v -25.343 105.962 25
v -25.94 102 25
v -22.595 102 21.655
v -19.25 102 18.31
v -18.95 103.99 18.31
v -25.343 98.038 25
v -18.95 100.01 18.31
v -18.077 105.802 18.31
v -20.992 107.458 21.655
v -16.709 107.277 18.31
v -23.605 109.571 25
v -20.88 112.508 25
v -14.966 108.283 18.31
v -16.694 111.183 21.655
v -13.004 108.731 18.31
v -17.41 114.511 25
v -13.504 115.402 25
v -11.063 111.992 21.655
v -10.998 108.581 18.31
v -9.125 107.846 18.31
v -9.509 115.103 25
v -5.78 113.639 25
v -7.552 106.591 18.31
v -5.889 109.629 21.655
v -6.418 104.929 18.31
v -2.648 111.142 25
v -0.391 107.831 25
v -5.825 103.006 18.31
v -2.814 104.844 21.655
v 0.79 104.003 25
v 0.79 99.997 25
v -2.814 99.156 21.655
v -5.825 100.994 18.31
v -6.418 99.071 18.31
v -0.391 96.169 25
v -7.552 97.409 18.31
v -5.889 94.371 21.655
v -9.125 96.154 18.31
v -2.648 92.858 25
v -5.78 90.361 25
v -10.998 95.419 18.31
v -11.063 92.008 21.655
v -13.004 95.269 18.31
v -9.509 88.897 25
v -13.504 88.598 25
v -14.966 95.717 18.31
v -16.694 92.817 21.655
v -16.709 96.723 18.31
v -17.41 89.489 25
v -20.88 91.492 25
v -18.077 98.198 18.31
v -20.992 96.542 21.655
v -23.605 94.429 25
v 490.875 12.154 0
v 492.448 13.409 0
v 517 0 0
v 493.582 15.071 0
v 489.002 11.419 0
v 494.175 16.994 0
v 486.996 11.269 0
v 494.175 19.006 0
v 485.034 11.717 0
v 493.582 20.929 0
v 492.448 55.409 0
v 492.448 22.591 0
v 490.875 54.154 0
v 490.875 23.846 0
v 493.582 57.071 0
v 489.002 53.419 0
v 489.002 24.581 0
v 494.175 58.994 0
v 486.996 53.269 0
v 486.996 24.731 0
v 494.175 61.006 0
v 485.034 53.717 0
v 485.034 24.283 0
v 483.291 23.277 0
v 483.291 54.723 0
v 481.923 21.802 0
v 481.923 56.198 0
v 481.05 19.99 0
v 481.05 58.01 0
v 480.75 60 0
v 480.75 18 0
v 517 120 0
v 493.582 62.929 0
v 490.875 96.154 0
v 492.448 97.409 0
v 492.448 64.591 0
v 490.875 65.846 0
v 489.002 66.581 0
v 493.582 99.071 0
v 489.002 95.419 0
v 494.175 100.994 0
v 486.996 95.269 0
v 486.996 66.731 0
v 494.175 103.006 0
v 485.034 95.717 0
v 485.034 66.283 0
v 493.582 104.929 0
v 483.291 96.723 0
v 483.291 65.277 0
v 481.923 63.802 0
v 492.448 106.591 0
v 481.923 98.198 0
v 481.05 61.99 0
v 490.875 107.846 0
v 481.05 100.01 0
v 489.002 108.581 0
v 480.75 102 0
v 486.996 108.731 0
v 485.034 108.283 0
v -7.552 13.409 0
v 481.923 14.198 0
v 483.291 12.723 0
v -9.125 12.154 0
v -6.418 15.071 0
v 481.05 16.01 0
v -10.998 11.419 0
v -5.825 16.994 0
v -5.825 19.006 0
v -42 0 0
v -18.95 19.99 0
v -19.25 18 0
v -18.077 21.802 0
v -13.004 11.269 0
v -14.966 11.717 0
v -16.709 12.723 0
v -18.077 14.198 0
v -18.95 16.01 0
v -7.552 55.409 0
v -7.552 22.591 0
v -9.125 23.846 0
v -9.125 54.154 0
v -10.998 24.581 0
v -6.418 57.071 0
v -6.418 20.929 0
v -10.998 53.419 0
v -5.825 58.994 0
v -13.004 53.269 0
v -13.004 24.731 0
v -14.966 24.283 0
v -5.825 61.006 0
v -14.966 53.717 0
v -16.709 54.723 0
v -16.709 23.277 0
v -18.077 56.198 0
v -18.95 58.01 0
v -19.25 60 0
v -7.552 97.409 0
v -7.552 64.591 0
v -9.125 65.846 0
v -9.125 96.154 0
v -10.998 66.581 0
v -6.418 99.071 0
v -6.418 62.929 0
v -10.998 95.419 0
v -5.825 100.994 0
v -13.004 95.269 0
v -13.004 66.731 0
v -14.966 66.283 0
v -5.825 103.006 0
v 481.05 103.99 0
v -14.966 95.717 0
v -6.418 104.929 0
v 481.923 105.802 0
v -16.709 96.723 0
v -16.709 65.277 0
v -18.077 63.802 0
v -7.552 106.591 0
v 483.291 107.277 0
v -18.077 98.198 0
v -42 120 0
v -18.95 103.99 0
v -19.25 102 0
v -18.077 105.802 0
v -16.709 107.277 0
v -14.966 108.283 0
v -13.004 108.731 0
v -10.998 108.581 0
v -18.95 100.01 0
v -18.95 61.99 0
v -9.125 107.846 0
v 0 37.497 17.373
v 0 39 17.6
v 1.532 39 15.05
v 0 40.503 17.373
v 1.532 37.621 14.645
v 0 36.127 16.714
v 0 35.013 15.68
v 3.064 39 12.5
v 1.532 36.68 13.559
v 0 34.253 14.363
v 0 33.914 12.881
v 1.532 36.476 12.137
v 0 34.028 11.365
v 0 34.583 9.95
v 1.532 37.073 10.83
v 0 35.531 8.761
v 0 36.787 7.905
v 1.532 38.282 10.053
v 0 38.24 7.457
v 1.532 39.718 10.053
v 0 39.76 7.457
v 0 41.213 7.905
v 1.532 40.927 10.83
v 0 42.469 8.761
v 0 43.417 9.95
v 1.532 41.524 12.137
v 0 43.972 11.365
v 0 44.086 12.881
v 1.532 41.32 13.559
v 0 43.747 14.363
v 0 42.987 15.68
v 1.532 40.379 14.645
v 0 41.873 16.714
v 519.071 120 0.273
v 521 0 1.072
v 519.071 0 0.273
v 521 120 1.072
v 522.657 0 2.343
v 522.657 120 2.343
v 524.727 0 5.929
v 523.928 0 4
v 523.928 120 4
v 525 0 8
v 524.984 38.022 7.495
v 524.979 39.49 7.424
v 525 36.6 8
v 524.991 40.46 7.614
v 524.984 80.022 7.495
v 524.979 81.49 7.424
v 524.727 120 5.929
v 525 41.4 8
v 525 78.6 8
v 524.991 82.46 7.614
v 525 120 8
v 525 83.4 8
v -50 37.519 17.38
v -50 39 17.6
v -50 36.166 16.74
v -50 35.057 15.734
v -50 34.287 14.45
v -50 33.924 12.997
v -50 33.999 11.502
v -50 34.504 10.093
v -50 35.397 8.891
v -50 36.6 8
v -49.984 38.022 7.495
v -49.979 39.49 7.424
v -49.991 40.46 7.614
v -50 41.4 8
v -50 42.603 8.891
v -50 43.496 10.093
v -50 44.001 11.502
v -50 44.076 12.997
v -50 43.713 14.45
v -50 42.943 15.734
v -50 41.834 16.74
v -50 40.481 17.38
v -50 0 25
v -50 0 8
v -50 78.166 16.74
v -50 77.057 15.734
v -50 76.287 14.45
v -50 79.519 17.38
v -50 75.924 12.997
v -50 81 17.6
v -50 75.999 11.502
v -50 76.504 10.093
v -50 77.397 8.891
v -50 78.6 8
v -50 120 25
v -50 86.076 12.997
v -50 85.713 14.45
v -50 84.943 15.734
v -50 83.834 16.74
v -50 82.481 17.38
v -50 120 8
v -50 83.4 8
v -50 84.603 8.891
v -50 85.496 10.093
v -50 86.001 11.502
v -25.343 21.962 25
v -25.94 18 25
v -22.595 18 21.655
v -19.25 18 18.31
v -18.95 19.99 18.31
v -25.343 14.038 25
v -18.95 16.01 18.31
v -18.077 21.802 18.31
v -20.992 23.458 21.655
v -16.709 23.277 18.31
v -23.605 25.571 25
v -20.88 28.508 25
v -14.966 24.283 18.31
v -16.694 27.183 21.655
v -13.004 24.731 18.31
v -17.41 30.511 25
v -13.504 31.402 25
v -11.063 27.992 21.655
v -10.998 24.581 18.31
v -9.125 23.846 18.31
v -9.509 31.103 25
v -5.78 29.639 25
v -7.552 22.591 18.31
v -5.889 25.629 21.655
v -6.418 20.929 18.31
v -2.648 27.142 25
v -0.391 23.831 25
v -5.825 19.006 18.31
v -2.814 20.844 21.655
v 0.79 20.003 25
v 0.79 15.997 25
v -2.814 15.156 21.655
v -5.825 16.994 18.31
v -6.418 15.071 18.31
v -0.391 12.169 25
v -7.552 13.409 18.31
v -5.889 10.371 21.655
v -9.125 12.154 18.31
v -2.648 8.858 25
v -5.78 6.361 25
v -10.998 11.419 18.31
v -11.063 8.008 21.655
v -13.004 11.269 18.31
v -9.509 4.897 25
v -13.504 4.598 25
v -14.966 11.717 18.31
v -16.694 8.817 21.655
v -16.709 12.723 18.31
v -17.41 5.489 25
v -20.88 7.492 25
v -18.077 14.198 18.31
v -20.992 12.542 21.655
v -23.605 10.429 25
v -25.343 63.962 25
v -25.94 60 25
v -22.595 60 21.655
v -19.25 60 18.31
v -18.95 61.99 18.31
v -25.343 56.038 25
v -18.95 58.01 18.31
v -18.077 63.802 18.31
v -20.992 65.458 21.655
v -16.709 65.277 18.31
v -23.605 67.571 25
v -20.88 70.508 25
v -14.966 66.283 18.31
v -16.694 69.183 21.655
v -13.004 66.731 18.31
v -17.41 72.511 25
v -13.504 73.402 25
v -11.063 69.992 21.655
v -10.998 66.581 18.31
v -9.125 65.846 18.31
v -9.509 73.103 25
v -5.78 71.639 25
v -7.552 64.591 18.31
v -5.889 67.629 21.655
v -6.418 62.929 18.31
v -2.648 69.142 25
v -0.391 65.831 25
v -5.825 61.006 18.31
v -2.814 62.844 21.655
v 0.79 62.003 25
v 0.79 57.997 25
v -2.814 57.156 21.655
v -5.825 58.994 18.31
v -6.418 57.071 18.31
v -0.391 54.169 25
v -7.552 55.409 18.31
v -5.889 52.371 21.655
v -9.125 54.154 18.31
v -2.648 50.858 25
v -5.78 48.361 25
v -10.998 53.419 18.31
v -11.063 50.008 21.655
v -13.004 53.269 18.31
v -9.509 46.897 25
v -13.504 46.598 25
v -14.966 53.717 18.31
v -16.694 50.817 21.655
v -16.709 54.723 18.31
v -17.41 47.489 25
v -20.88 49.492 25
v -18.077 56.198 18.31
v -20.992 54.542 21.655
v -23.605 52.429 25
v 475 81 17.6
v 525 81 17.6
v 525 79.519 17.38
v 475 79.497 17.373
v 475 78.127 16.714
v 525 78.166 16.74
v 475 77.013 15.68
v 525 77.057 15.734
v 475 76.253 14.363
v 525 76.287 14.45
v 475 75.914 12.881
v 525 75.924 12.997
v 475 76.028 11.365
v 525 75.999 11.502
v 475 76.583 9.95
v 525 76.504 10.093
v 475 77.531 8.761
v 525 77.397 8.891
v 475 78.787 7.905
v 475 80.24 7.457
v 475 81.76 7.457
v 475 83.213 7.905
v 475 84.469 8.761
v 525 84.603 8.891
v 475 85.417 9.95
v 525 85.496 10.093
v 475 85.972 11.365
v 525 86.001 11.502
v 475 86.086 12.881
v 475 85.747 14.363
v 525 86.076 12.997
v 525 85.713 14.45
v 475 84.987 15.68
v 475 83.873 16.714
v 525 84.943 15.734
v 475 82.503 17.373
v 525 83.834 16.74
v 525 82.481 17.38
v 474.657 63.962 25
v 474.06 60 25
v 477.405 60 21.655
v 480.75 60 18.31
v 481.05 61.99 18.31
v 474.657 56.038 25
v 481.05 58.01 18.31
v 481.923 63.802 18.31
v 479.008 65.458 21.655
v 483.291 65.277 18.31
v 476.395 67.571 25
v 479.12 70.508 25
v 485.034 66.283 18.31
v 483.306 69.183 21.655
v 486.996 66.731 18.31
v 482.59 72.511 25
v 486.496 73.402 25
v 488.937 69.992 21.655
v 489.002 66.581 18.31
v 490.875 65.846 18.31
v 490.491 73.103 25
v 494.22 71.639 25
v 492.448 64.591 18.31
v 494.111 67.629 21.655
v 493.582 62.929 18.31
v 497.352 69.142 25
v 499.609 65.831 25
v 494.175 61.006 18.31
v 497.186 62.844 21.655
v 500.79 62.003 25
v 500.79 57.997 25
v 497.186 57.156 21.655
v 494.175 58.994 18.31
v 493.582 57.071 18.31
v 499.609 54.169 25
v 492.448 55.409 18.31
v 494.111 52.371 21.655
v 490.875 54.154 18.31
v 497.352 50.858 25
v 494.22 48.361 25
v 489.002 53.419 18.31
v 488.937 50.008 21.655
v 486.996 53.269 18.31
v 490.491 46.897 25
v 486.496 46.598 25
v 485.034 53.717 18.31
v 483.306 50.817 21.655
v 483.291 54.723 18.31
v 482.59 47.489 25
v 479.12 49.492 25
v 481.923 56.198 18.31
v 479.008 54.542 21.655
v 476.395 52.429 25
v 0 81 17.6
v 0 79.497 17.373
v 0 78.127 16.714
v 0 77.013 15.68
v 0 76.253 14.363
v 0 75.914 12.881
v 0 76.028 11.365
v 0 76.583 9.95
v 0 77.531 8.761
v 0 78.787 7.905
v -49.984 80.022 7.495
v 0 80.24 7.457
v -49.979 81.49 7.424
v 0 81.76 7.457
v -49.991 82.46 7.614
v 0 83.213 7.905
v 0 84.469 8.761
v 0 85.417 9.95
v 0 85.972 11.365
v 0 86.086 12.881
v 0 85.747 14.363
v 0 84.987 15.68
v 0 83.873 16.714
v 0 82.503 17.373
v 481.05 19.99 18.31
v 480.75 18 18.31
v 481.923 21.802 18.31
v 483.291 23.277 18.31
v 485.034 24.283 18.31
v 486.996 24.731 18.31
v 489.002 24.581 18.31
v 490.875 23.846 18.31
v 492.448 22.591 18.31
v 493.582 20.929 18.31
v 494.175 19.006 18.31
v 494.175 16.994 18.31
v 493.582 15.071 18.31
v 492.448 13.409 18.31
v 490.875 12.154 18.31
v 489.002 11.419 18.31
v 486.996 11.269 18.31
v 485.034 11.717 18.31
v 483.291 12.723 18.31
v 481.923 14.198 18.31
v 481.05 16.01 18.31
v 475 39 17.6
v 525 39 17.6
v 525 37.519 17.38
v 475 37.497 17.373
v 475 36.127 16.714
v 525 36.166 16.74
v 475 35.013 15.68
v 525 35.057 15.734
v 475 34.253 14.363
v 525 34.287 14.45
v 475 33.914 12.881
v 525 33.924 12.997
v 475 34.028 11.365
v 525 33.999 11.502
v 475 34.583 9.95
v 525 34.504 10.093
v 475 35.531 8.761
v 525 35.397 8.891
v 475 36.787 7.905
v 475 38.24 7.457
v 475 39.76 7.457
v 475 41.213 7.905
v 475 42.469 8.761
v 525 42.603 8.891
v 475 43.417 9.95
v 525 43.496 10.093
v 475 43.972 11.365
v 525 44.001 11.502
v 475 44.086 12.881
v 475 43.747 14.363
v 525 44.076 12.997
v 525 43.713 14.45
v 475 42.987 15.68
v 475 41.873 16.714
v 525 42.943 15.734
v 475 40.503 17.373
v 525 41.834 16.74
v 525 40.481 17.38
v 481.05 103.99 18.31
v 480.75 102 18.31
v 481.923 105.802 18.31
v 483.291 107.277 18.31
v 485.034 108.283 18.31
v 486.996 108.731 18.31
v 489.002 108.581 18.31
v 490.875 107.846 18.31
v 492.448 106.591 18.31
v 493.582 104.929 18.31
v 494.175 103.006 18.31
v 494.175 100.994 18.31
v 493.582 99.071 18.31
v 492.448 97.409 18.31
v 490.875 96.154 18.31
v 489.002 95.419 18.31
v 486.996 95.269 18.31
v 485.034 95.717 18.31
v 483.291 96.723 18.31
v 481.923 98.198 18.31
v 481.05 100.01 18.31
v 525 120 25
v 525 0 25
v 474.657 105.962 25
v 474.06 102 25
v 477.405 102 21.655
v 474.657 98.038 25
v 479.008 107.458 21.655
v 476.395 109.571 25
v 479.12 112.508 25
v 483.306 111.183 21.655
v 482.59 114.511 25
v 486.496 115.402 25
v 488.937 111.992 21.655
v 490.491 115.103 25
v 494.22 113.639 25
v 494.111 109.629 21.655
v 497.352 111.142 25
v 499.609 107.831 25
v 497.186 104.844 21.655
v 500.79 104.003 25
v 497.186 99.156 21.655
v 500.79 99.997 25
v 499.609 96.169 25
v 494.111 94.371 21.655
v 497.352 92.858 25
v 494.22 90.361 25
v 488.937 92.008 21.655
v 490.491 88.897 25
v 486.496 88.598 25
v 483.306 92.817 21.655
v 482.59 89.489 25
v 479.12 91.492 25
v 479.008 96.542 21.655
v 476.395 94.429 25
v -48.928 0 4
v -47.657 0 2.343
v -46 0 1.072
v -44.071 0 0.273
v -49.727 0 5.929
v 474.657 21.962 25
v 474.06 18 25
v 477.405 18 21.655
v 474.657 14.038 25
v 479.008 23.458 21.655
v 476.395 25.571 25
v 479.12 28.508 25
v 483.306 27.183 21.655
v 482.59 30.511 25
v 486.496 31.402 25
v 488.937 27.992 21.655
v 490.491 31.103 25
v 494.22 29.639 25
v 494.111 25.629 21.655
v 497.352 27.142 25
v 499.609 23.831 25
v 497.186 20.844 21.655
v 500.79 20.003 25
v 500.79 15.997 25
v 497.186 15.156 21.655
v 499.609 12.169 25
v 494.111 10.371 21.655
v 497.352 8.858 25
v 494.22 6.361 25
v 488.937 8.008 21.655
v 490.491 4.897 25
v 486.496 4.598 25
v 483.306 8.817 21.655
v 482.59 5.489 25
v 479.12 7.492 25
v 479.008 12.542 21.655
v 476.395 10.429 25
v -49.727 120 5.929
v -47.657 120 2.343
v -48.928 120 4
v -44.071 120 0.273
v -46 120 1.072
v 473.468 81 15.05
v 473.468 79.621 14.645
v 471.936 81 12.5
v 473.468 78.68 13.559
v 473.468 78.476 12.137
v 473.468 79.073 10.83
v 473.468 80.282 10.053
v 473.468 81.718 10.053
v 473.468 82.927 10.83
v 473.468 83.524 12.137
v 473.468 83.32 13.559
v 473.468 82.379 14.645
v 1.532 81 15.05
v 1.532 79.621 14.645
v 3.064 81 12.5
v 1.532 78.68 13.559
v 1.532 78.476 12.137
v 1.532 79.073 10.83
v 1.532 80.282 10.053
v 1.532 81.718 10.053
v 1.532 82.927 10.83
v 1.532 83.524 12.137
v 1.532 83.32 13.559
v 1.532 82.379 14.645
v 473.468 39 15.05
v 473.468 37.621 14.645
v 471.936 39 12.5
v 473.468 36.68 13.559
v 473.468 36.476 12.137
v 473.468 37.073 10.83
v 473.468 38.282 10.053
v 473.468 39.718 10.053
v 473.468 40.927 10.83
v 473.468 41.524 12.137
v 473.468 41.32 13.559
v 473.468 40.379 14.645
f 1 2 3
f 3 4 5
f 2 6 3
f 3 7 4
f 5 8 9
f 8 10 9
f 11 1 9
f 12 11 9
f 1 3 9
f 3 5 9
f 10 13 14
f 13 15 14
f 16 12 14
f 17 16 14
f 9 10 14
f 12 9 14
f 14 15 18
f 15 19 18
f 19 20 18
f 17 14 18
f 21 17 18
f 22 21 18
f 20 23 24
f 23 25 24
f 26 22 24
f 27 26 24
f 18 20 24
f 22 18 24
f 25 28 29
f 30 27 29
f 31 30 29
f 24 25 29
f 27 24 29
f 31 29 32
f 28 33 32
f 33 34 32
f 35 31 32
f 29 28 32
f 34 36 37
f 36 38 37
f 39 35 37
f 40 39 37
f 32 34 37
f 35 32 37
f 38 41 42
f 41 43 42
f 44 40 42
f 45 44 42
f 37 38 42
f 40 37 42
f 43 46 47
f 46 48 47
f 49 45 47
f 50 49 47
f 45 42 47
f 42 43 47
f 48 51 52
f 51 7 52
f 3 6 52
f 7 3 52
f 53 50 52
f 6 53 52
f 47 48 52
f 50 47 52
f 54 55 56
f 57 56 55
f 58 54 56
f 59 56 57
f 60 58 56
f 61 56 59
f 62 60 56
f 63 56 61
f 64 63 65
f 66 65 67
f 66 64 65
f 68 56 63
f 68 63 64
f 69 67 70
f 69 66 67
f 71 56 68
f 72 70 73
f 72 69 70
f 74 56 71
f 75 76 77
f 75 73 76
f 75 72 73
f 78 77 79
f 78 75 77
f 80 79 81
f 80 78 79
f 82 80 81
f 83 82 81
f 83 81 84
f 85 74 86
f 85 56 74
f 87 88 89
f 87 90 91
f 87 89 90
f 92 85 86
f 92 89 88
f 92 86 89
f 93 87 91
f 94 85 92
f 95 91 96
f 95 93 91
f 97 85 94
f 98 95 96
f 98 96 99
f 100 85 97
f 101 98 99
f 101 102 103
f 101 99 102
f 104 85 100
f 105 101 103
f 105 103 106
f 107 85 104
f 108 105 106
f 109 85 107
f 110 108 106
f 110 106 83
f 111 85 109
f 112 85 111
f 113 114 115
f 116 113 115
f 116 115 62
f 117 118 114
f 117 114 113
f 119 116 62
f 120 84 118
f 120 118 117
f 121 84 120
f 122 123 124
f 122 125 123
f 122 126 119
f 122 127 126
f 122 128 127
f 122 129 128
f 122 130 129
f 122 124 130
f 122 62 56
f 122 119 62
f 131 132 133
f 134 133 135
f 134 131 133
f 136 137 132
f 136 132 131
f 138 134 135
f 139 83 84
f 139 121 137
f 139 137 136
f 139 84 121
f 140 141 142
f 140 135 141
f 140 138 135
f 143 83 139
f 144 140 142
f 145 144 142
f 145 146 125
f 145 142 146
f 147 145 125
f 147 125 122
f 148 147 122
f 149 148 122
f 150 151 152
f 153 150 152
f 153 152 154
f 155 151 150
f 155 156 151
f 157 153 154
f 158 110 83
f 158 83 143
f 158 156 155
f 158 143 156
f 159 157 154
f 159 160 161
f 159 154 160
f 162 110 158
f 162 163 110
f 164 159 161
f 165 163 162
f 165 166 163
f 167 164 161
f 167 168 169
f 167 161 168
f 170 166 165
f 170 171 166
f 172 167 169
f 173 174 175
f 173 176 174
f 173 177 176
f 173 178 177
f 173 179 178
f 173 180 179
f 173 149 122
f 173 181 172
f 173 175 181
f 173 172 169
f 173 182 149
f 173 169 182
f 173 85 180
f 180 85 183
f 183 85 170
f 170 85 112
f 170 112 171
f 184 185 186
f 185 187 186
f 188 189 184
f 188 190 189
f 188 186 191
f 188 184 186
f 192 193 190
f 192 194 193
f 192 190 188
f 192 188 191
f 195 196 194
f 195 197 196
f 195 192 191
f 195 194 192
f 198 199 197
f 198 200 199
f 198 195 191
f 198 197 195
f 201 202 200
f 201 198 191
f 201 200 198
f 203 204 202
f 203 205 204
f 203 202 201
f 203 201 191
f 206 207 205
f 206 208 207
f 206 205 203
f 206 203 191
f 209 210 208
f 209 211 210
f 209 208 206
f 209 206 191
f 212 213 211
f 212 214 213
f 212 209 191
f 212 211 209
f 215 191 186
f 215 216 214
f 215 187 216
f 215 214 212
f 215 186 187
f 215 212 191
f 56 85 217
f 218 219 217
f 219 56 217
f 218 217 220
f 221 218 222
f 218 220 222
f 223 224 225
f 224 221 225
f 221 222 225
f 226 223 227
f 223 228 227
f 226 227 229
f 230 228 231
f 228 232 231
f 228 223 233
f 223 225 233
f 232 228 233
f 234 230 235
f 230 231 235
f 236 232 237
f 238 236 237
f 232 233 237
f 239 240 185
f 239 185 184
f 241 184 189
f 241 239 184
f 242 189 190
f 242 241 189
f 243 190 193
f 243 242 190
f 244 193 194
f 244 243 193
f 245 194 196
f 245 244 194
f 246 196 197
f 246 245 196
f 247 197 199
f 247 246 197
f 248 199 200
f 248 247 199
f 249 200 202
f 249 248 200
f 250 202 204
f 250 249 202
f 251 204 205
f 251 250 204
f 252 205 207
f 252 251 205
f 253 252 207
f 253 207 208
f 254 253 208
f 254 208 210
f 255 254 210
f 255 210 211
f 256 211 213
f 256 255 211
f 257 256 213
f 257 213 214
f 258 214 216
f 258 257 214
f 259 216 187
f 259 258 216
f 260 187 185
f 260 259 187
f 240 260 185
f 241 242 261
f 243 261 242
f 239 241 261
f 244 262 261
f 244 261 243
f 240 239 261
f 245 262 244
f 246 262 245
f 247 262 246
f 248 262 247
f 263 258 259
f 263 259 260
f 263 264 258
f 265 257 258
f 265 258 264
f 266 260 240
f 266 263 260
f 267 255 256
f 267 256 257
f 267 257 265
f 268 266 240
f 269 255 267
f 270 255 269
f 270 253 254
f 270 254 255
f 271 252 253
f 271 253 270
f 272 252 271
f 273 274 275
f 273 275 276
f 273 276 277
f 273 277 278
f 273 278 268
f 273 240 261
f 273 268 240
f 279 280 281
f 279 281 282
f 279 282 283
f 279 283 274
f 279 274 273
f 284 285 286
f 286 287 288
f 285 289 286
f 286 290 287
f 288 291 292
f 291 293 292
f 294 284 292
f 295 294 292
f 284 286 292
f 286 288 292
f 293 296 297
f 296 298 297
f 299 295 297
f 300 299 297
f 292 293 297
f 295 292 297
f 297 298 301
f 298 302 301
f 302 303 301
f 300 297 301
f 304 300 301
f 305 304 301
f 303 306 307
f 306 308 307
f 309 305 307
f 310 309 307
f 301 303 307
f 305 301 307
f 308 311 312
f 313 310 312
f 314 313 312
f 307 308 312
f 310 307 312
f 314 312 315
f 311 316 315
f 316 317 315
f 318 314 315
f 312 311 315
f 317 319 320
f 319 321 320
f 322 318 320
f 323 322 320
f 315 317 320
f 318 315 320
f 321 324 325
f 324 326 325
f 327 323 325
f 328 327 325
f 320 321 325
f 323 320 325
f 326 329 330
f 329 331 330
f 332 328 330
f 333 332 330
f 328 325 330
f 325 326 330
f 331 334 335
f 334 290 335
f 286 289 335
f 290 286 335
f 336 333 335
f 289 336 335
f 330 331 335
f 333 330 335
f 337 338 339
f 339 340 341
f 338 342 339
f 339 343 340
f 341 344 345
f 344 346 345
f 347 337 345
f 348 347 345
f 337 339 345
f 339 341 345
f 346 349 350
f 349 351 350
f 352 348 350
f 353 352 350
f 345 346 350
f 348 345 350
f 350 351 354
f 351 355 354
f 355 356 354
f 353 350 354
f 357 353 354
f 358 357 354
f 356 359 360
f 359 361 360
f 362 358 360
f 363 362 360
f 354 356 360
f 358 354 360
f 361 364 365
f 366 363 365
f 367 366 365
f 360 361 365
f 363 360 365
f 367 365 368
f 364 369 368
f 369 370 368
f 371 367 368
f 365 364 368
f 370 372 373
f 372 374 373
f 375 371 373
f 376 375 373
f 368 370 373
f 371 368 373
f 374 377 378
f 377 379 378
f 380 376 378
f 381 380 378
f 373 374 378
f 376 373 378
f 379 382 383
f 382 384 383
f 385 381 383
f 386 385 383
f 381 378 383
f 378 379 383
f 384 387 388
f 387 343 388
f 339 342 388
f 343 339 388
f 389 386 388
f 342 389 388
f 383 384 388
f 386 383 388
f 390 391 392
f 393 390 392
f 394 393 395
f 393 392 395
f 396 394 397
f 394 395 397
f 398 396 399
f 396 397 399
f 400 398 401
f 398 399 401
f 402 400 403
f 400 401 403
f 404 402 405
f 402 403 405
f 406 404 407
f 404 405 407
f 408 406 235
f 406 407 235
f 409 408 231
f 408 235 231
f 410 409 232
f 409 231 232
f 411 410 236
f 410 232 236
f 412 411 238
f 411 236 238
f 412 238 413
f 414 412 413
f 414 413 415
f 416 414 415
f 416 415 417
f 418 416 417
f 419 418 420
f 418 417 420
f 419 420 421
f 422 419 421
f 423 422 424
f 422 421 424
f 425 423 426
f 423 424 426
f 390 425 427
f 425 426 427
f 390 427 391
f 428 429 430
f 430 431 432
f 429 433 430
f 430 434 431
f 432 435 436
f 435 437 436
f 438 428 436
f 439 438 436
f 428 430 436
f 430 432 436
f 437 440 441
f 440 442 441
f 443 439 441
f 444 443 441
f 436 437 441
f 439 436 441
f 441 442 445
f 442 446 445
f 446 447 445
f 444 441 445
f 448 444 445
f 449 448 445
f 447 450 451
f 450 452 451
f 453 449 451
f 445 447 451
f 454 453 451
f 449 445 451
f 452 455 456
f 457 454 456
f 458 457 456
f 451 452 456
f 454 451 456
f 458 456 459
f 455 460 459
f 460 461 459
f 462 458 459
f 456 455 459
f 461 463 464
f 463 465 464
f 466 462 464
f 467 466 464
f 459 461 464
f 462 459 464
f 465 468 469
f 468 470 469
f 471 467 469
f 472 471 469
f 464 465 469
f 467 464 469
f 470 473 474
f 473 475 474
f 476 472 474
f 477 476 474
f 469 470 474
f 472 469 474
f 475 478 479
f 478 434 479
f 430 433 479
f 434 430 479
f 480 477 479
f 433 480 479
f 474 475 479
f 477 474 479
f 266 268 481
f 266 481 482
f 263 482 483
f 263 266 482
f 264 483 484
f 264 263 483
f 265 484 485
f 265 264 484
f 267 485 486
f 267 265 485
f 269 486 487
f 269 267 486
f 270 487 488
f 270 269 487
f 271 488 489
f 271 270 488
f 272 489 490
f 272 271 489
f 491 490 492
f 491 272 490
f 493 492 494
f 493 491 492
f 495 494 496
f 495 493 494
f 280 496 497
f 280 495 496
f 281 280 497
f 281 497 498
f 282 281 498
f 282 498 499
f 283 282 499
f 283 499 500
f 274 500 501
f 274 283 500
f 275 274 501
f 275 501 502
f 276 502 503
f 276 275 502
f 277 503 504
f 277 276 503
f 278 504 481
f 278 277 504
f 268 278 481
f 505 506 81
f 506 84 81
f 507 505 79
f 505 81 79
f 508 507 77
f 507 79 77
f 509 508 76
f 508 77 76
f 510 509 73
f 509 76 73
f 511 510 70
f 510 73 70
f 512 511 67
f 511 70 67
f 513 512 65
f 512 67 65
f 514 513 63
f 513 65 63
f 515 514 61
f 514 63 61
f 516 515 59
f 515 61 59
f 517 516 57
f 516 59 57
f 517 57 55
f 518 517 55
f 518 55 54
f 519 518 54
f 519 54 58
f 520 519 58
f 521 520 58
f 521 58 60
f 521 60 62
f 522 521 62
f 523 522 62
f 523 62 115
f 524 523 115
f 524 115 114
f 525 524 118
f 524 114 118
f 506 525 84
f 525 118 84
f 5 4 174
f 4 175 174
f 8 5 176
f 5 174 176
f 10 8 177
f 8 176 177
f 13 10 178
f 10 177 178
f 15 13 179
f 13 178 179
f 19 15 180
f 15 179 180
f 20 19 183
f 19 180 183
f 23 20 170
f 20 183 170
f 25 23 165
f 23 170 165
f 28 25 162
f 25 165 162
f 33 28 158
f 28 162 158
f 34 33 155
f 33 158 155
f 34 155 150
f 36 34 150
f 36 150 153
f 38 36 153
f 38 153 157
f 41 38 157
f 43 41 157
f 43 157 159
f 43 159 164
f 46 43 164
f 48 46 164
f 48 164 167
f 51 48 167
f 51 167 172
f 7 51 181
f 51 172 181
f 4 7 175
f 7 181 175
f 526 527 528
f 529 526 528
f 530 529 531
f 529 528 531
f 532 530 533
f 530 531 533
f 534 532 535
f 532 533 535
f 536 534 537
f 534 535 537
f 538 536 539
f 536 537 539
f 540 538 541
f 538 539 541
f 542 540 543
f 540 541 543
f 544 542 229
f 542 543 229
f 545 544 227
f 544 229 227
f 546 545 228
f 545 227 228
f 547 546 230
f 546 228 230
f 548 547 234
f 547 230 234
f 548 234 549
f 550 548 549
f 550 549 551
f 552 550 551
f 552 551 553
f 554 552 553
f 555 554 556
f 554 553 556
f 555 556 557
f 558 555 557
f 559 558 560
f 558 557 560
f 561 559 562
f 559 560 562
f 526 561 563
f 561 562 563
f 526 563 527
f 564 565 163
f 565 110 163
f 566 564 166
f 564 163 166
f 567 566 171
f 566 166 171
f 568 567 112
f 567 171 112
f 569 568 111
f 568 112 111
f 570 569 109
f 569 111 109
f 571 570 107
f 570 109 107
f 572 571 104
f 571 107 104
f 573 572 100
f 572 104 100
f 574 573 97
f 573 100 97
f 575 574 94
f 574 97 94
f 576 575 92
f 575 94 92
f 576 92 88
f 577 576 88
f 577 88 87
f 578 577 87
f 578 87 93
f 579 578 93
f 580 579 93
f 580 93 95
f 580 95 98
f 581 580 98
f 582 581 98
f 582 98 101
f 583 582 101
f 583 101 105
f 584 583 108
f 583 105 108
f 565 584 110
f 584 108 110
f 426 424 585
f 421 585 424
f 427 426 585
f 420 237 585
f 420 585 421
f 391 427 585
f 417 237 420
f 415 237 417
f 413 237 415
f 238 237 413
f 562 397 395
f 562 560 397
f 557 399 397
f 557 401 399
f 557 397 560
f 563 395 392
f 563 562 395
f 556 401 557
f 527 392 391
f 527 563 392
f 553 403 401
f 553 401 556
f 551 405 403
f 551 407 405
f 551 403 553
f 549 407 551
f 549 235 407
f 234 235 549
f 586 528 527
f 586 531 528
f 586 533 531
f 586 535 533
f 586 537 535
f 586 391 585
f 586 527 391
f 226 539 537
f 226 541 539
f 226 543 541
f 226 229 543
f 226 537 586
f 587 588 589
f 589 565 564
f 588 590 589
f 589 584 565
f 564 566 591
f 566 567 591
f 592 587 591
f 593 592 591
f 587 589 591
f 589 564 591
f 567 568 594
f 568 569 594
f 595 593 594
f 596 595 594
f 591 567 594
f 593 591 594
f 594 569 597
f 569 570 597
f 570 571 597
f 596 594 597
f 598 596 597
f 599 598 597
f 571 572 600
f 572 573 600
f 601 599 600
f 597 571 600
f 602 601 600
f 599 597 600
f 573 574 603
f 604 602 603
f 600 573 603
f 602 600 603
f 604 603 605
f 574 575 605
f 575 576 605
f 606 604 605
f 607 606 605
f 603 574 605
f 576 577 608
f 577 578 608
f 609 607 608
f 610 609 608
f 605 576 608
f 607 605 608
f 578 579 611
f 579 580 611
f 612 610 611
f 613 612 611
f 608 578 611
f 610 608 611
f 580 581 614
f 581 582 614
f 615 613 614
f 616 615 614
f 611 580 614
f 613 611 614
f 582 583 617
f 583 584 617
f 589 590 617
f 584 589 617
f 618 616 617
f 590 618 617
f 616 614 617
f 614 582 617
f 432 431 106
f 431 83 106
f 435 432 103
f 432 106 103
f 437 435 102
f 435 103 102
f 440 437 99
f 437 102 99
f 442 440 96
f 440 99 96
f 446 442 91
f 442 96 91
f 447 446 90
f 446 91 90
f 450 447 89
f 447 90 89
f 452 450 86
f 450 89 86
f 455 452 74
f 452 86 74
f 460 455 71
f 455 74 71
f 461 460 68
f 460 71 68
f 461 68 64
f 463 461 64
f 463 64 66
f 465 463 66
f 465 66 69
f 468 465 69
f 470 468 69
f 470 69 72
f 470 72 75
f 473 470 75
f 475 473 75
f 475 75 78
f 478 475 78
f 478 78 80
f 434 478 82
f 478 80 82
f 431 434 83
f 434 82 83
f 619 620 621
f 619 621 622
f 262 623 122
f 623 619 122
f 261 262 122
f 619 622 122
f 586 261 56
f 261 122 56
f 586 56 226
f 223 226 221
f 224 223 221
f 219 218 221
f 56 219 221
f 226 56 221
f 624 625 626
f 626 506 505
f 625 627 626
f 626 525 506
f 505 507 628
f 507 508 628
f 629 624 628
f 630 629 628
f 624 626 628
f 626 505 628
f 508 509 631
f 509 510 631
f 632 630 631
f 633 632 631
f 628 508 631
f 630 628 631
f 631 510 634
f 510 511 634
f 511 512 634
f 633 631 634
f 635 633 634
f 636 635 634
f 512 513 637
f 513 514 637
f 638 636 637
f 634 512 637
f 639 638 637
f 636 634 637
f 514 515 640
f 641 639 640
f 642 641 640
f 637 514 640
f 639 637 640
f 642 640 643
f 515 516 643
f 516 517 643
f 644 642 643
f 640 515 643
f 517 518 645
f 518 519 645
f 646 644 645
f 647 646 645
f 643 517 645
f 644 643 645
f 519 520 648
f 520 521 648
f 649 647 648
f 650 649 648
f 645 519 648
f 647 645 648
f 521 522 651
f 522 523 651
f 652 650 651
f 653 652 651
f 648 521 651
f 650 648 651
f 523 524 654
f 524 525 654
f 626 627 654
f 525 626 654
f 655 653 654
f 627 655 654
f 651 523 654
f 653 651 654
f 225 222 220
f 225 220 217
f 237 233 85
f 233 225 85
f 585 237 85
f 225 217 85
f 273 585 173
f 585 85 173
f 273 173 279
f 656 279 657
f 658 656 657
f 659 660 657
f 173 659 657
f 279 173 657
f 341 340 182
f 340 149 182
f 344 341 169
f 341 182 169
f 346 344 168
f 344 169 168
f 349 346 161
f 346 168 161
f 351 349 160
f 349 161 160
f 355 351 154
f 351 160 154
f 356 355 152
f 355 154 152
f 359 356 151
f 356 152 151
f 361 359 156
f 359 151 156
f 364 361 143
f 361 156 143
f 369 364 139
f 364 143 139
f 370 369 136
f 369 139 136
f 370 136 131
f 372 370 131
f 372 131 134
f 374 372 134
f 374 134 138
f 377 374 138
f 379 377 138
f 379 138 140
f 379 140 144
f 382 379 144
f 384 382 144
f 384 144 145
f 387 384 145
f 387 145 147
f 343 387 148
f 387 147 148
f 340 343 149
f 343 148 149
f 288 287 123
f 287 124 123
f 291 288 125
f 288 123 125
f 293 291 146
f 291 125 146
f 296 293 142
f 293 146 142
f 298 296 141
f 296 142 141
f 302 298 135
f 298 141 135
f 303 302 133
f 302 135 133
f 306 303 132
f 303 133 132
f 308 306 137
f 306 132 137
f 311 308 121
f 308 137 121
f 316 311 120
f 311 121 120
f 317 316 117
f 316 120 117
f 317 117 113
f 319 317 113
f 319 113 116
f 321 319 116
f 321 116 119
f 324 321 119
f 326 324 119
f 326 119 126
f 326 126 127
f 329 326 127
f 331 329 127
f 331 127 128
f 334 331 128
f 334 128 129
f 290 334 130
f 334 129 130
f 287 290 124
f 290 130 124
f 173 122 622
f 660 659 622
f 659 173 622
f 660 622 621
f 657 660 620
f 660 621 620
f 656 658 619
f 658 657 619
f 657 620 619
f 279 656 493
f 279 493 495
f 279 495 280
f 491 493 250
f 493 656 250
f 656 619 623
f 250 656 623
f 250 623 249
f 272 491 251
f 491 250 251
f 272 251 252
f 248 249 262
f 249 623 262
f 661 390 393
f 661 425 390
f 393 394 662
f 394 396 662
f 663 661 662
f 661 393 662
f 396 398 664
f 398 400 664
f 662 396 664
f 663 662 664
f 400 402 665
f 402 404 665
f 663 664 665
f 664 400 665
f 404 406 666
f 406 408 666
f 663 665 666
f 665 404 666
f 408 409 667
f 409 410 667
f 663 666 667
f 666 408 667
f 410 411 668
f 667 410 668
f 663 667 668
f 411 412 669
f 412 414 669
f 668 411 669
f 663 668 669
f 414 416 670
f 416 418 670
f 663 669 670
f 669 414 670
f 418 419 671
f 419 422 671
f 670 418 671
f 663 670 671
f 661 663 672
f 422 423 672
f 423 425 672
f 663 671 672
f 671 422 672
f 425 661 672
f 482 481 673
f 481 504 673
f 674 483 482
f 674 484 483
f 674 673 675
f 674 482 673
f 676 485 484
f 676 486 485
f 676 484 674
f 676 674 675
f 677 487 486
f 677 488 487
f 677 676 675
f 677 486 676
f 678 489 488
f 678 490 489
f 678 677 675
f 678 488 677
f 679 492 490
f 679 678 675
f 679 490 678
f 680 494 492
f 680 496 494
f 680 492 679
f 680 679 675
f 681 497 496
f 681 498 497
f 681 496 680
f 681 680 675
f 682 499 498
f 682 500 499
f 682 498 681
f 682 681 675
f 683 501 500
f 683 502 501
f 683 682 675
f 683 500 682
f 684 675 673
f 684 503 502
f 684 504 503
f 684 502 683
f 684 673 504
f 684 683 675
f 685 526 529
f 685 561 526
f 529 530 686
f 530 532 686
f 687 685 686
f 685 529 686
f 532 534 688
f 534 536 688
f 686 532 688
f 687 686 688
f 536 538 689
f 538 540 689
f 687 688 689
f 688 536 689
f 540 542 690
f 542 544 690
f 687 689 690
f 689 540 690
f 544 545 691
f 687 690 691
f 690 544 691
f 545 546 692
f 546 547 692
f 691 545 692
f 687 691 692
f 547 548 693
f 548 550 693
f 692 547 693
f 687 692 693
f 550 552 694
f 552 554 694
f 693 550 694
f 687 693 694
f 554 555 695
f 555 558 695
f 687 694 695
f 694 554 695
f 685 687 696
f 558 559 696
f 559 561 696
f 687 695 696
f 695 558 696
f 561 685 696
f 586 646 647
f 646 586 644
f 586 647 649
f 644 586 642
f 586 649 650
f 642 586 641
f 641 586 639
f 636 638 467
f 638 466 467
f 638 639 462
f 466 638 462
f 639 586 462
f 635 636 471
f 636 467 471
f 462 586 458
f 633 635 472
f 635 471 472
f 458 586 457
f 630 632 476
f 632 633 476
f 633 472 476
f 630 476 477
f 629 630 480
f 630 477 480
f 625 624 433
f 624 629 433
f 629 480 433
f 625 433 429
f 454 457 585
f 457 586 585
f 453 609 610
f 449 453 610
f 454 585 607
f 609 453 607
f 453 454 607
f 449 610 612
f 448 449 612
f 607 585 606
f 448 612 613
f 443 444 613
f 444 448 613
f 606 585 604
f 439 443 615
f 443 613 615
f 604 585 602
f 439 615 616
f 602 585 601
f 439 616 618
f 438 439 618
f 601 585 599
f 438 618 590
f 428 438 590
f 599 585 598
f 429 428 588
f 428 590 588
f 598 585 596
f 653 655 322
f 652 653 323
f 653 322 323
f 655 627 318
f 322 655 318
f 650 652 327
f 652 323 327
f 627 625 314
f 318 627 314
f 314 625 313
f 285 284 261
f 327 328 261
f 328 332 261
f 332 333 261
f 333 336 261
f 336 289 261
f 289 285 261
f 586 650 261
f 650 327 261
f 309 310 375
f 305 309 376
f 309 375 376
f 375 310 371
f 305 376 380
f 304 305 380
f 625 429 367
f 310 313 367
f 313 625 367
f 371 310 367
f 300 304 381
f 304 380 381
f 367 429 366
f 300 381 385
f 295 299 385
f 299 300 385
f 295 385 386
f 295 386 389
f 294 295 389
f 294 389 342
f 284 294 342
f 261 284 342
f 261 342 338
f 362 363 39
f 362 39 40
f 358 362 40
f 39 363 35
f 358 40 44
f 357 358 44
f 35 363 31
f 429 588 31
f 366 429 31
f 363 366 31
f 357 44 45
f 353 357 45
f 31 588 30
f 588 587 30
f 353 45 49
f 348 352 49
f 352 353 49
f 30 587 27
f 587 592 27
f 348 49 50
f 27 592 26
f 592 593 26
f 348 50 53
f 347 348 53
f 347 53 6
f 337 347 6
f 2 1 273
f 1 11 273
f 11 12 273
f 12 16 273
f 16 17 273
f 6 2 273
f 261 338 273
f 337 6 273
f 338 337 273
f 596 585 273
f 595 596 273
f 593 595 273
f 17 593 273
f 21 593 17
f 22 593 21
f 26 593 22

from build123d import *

# Parameters (mm, degrees)
RESSALTO_EXTRUS_O1_DEPTH                            = 25
ESCAREADO_PARA_PARAFUSO_ALLEN_SEXTAVADO_D           = 13.5
ESCAREADO_PARA_PARAFUSO_ALLEN_SEXTAVADO_DEPTH       = 25
ESCAREADO_PARA_PARAFUSO_ALLEN_SEXTAVADO_CSINK_D     = 26.88
ESCAREADO_PARA_PARAFUSO_ALLEN_SEXTAVADO_CSINK_ANGLE = 90
ESCAREADO_PARA_PARAFUSO_ALLEN_SEXTAVADO_TIP         = 4.055809178
FURO_ROSCADO_DE_M121_AT_2_COUNT                     = 2
FURO_ROSCADO_DE_M121_AT_2_PITCH                     = 42
FILETE1_R                                           = 8


with BuildPart() as part:
    # Esboço1 → Ressalto-extrusão1 (new body)
    with BuildSketch(Plane.XY):
        Polygon((-25, 120), (500, 120), (525, 120), (525, 0), (500, 0), (-25, 0), (-50, 0), (-50, 120), align=None)
    extrude(amount=RESSALTO_EXTRUS_O1_DEPTH)

    # Escareado para parafuso Allen sextavado escareado de M121
    with Locations(Plane.XY.offset(25)):
        with Locations((-12.5, 102), (-12.5, 60), (-12.5, 18), (487.5, 102), (487.5, 60), (487.5, 18)):
            CounterSinkHole(ESCAREADO_PARA_PARAFUSO_ALLEN_SEXTAVADO_D / 2, ESCAREADO_PARA_PARAFUSO_ALLEN_SEXTAVADO_CSINK_D / 2, depth=ESCAREADO_PARA_PARAFUSO_ALLEN_SEXTAVADO_DEPTH, counter_sink_angle=ESCAREADO_PARA_PARAFUSO_ALLEN_SEXTAVADO_CSINK_ANGLE)
            with Locations((0, 0, -(ESCAREADO_PARA_PARAFUSO_ALLEN_SEXTAVADO_DEPTH + ESCAREADO_PARA_PARAFUSO_ALLEN_SEXTAVADO_TIP / 2))):  # 118° drill point
                Cone(0, ESCAREADO_PARA_PARAFUSO_ALLEN_SEXTAVADO_D / 2, ESCAREADO_PARA_PARAFUSO_ALLEN_SEXTAVADO_TIP, mode=Mode.SUBTRACT)

    # Esboço6 → Furo roscado de M121 (revolve, cut)
    with BuildSketch(Plane(origin=(-50, 81, 12.5), x_dir=(0, 0, 1), z_dir=(0, 1, 0))):
        Polygon((0, 0), (0, 53.064389157), (5.1, 50), (5.1, 0), align=None)
    furo_roscado_de_m121 = revolve(axis=Axis((-56.35, 81, 12.5), (1, 0, 0)), mode=Mode.SUBTRACT)

    # Furo roscado de M121 at 2: Furo roscado de M121 ×2
    with Locations(*[(0, -i * FURO_ROSCADO_DE_M121_AT_2_PITCH, 0) for i in range(1, FURO_ROSCADO_DE_M121_AT_2_COUNT)]):
        add(furo_roscado_de_m121, mode=Mode.SUBTRACT)

    # Espelhar1: Furo roscado de M121 across plane
    add(furo_roscado_de_m121.mirror(Plane.ZY.offset(-237.5)), mode=Mode.SUBTRACT)

    # Espelhar1 copy 1 sketch → Espelhar1 copy 1 (revolve, cut)
    with BuildSketch(Plane(origin=(525, 39, 12.5), x_dir=(0, 0, 1), z_dir=(0, 1, 0))):
        Polygon((0, 0), (0, -53.064389157), (5.1, -50), (5.1, 0), align=None)
    revolve(axis=Axis((531.35, 39, 12.5), (1, 0, 0)), mode=Mode.SUBTRACT)

    # Filete1
    # the kernel refuses this fillet: 8 mm, written as the material it takes off along each edge
    with BuildSketch(Plane(origin=(-50, -20, 0), x_dir=(0, 0, 1), z_dir=(0, 1, 0)), Plane(origin=(525, 140, 0), x_dir=(0, 0, 1), z_dir=(0, -1, 0))) as filete1_piece_1:
        with BuildLine():
            CenterArc((FILETE1_R, FILETE1_R), FILETE1_R, 180, 90)
            Line((0, FILETE1_R), (0, 0))
            Line((0, 0), (FILETE1_R, 0))
        make_face()
    extrude(amount=160, mode=Mode.SUBTRACT)


solid = part.part
